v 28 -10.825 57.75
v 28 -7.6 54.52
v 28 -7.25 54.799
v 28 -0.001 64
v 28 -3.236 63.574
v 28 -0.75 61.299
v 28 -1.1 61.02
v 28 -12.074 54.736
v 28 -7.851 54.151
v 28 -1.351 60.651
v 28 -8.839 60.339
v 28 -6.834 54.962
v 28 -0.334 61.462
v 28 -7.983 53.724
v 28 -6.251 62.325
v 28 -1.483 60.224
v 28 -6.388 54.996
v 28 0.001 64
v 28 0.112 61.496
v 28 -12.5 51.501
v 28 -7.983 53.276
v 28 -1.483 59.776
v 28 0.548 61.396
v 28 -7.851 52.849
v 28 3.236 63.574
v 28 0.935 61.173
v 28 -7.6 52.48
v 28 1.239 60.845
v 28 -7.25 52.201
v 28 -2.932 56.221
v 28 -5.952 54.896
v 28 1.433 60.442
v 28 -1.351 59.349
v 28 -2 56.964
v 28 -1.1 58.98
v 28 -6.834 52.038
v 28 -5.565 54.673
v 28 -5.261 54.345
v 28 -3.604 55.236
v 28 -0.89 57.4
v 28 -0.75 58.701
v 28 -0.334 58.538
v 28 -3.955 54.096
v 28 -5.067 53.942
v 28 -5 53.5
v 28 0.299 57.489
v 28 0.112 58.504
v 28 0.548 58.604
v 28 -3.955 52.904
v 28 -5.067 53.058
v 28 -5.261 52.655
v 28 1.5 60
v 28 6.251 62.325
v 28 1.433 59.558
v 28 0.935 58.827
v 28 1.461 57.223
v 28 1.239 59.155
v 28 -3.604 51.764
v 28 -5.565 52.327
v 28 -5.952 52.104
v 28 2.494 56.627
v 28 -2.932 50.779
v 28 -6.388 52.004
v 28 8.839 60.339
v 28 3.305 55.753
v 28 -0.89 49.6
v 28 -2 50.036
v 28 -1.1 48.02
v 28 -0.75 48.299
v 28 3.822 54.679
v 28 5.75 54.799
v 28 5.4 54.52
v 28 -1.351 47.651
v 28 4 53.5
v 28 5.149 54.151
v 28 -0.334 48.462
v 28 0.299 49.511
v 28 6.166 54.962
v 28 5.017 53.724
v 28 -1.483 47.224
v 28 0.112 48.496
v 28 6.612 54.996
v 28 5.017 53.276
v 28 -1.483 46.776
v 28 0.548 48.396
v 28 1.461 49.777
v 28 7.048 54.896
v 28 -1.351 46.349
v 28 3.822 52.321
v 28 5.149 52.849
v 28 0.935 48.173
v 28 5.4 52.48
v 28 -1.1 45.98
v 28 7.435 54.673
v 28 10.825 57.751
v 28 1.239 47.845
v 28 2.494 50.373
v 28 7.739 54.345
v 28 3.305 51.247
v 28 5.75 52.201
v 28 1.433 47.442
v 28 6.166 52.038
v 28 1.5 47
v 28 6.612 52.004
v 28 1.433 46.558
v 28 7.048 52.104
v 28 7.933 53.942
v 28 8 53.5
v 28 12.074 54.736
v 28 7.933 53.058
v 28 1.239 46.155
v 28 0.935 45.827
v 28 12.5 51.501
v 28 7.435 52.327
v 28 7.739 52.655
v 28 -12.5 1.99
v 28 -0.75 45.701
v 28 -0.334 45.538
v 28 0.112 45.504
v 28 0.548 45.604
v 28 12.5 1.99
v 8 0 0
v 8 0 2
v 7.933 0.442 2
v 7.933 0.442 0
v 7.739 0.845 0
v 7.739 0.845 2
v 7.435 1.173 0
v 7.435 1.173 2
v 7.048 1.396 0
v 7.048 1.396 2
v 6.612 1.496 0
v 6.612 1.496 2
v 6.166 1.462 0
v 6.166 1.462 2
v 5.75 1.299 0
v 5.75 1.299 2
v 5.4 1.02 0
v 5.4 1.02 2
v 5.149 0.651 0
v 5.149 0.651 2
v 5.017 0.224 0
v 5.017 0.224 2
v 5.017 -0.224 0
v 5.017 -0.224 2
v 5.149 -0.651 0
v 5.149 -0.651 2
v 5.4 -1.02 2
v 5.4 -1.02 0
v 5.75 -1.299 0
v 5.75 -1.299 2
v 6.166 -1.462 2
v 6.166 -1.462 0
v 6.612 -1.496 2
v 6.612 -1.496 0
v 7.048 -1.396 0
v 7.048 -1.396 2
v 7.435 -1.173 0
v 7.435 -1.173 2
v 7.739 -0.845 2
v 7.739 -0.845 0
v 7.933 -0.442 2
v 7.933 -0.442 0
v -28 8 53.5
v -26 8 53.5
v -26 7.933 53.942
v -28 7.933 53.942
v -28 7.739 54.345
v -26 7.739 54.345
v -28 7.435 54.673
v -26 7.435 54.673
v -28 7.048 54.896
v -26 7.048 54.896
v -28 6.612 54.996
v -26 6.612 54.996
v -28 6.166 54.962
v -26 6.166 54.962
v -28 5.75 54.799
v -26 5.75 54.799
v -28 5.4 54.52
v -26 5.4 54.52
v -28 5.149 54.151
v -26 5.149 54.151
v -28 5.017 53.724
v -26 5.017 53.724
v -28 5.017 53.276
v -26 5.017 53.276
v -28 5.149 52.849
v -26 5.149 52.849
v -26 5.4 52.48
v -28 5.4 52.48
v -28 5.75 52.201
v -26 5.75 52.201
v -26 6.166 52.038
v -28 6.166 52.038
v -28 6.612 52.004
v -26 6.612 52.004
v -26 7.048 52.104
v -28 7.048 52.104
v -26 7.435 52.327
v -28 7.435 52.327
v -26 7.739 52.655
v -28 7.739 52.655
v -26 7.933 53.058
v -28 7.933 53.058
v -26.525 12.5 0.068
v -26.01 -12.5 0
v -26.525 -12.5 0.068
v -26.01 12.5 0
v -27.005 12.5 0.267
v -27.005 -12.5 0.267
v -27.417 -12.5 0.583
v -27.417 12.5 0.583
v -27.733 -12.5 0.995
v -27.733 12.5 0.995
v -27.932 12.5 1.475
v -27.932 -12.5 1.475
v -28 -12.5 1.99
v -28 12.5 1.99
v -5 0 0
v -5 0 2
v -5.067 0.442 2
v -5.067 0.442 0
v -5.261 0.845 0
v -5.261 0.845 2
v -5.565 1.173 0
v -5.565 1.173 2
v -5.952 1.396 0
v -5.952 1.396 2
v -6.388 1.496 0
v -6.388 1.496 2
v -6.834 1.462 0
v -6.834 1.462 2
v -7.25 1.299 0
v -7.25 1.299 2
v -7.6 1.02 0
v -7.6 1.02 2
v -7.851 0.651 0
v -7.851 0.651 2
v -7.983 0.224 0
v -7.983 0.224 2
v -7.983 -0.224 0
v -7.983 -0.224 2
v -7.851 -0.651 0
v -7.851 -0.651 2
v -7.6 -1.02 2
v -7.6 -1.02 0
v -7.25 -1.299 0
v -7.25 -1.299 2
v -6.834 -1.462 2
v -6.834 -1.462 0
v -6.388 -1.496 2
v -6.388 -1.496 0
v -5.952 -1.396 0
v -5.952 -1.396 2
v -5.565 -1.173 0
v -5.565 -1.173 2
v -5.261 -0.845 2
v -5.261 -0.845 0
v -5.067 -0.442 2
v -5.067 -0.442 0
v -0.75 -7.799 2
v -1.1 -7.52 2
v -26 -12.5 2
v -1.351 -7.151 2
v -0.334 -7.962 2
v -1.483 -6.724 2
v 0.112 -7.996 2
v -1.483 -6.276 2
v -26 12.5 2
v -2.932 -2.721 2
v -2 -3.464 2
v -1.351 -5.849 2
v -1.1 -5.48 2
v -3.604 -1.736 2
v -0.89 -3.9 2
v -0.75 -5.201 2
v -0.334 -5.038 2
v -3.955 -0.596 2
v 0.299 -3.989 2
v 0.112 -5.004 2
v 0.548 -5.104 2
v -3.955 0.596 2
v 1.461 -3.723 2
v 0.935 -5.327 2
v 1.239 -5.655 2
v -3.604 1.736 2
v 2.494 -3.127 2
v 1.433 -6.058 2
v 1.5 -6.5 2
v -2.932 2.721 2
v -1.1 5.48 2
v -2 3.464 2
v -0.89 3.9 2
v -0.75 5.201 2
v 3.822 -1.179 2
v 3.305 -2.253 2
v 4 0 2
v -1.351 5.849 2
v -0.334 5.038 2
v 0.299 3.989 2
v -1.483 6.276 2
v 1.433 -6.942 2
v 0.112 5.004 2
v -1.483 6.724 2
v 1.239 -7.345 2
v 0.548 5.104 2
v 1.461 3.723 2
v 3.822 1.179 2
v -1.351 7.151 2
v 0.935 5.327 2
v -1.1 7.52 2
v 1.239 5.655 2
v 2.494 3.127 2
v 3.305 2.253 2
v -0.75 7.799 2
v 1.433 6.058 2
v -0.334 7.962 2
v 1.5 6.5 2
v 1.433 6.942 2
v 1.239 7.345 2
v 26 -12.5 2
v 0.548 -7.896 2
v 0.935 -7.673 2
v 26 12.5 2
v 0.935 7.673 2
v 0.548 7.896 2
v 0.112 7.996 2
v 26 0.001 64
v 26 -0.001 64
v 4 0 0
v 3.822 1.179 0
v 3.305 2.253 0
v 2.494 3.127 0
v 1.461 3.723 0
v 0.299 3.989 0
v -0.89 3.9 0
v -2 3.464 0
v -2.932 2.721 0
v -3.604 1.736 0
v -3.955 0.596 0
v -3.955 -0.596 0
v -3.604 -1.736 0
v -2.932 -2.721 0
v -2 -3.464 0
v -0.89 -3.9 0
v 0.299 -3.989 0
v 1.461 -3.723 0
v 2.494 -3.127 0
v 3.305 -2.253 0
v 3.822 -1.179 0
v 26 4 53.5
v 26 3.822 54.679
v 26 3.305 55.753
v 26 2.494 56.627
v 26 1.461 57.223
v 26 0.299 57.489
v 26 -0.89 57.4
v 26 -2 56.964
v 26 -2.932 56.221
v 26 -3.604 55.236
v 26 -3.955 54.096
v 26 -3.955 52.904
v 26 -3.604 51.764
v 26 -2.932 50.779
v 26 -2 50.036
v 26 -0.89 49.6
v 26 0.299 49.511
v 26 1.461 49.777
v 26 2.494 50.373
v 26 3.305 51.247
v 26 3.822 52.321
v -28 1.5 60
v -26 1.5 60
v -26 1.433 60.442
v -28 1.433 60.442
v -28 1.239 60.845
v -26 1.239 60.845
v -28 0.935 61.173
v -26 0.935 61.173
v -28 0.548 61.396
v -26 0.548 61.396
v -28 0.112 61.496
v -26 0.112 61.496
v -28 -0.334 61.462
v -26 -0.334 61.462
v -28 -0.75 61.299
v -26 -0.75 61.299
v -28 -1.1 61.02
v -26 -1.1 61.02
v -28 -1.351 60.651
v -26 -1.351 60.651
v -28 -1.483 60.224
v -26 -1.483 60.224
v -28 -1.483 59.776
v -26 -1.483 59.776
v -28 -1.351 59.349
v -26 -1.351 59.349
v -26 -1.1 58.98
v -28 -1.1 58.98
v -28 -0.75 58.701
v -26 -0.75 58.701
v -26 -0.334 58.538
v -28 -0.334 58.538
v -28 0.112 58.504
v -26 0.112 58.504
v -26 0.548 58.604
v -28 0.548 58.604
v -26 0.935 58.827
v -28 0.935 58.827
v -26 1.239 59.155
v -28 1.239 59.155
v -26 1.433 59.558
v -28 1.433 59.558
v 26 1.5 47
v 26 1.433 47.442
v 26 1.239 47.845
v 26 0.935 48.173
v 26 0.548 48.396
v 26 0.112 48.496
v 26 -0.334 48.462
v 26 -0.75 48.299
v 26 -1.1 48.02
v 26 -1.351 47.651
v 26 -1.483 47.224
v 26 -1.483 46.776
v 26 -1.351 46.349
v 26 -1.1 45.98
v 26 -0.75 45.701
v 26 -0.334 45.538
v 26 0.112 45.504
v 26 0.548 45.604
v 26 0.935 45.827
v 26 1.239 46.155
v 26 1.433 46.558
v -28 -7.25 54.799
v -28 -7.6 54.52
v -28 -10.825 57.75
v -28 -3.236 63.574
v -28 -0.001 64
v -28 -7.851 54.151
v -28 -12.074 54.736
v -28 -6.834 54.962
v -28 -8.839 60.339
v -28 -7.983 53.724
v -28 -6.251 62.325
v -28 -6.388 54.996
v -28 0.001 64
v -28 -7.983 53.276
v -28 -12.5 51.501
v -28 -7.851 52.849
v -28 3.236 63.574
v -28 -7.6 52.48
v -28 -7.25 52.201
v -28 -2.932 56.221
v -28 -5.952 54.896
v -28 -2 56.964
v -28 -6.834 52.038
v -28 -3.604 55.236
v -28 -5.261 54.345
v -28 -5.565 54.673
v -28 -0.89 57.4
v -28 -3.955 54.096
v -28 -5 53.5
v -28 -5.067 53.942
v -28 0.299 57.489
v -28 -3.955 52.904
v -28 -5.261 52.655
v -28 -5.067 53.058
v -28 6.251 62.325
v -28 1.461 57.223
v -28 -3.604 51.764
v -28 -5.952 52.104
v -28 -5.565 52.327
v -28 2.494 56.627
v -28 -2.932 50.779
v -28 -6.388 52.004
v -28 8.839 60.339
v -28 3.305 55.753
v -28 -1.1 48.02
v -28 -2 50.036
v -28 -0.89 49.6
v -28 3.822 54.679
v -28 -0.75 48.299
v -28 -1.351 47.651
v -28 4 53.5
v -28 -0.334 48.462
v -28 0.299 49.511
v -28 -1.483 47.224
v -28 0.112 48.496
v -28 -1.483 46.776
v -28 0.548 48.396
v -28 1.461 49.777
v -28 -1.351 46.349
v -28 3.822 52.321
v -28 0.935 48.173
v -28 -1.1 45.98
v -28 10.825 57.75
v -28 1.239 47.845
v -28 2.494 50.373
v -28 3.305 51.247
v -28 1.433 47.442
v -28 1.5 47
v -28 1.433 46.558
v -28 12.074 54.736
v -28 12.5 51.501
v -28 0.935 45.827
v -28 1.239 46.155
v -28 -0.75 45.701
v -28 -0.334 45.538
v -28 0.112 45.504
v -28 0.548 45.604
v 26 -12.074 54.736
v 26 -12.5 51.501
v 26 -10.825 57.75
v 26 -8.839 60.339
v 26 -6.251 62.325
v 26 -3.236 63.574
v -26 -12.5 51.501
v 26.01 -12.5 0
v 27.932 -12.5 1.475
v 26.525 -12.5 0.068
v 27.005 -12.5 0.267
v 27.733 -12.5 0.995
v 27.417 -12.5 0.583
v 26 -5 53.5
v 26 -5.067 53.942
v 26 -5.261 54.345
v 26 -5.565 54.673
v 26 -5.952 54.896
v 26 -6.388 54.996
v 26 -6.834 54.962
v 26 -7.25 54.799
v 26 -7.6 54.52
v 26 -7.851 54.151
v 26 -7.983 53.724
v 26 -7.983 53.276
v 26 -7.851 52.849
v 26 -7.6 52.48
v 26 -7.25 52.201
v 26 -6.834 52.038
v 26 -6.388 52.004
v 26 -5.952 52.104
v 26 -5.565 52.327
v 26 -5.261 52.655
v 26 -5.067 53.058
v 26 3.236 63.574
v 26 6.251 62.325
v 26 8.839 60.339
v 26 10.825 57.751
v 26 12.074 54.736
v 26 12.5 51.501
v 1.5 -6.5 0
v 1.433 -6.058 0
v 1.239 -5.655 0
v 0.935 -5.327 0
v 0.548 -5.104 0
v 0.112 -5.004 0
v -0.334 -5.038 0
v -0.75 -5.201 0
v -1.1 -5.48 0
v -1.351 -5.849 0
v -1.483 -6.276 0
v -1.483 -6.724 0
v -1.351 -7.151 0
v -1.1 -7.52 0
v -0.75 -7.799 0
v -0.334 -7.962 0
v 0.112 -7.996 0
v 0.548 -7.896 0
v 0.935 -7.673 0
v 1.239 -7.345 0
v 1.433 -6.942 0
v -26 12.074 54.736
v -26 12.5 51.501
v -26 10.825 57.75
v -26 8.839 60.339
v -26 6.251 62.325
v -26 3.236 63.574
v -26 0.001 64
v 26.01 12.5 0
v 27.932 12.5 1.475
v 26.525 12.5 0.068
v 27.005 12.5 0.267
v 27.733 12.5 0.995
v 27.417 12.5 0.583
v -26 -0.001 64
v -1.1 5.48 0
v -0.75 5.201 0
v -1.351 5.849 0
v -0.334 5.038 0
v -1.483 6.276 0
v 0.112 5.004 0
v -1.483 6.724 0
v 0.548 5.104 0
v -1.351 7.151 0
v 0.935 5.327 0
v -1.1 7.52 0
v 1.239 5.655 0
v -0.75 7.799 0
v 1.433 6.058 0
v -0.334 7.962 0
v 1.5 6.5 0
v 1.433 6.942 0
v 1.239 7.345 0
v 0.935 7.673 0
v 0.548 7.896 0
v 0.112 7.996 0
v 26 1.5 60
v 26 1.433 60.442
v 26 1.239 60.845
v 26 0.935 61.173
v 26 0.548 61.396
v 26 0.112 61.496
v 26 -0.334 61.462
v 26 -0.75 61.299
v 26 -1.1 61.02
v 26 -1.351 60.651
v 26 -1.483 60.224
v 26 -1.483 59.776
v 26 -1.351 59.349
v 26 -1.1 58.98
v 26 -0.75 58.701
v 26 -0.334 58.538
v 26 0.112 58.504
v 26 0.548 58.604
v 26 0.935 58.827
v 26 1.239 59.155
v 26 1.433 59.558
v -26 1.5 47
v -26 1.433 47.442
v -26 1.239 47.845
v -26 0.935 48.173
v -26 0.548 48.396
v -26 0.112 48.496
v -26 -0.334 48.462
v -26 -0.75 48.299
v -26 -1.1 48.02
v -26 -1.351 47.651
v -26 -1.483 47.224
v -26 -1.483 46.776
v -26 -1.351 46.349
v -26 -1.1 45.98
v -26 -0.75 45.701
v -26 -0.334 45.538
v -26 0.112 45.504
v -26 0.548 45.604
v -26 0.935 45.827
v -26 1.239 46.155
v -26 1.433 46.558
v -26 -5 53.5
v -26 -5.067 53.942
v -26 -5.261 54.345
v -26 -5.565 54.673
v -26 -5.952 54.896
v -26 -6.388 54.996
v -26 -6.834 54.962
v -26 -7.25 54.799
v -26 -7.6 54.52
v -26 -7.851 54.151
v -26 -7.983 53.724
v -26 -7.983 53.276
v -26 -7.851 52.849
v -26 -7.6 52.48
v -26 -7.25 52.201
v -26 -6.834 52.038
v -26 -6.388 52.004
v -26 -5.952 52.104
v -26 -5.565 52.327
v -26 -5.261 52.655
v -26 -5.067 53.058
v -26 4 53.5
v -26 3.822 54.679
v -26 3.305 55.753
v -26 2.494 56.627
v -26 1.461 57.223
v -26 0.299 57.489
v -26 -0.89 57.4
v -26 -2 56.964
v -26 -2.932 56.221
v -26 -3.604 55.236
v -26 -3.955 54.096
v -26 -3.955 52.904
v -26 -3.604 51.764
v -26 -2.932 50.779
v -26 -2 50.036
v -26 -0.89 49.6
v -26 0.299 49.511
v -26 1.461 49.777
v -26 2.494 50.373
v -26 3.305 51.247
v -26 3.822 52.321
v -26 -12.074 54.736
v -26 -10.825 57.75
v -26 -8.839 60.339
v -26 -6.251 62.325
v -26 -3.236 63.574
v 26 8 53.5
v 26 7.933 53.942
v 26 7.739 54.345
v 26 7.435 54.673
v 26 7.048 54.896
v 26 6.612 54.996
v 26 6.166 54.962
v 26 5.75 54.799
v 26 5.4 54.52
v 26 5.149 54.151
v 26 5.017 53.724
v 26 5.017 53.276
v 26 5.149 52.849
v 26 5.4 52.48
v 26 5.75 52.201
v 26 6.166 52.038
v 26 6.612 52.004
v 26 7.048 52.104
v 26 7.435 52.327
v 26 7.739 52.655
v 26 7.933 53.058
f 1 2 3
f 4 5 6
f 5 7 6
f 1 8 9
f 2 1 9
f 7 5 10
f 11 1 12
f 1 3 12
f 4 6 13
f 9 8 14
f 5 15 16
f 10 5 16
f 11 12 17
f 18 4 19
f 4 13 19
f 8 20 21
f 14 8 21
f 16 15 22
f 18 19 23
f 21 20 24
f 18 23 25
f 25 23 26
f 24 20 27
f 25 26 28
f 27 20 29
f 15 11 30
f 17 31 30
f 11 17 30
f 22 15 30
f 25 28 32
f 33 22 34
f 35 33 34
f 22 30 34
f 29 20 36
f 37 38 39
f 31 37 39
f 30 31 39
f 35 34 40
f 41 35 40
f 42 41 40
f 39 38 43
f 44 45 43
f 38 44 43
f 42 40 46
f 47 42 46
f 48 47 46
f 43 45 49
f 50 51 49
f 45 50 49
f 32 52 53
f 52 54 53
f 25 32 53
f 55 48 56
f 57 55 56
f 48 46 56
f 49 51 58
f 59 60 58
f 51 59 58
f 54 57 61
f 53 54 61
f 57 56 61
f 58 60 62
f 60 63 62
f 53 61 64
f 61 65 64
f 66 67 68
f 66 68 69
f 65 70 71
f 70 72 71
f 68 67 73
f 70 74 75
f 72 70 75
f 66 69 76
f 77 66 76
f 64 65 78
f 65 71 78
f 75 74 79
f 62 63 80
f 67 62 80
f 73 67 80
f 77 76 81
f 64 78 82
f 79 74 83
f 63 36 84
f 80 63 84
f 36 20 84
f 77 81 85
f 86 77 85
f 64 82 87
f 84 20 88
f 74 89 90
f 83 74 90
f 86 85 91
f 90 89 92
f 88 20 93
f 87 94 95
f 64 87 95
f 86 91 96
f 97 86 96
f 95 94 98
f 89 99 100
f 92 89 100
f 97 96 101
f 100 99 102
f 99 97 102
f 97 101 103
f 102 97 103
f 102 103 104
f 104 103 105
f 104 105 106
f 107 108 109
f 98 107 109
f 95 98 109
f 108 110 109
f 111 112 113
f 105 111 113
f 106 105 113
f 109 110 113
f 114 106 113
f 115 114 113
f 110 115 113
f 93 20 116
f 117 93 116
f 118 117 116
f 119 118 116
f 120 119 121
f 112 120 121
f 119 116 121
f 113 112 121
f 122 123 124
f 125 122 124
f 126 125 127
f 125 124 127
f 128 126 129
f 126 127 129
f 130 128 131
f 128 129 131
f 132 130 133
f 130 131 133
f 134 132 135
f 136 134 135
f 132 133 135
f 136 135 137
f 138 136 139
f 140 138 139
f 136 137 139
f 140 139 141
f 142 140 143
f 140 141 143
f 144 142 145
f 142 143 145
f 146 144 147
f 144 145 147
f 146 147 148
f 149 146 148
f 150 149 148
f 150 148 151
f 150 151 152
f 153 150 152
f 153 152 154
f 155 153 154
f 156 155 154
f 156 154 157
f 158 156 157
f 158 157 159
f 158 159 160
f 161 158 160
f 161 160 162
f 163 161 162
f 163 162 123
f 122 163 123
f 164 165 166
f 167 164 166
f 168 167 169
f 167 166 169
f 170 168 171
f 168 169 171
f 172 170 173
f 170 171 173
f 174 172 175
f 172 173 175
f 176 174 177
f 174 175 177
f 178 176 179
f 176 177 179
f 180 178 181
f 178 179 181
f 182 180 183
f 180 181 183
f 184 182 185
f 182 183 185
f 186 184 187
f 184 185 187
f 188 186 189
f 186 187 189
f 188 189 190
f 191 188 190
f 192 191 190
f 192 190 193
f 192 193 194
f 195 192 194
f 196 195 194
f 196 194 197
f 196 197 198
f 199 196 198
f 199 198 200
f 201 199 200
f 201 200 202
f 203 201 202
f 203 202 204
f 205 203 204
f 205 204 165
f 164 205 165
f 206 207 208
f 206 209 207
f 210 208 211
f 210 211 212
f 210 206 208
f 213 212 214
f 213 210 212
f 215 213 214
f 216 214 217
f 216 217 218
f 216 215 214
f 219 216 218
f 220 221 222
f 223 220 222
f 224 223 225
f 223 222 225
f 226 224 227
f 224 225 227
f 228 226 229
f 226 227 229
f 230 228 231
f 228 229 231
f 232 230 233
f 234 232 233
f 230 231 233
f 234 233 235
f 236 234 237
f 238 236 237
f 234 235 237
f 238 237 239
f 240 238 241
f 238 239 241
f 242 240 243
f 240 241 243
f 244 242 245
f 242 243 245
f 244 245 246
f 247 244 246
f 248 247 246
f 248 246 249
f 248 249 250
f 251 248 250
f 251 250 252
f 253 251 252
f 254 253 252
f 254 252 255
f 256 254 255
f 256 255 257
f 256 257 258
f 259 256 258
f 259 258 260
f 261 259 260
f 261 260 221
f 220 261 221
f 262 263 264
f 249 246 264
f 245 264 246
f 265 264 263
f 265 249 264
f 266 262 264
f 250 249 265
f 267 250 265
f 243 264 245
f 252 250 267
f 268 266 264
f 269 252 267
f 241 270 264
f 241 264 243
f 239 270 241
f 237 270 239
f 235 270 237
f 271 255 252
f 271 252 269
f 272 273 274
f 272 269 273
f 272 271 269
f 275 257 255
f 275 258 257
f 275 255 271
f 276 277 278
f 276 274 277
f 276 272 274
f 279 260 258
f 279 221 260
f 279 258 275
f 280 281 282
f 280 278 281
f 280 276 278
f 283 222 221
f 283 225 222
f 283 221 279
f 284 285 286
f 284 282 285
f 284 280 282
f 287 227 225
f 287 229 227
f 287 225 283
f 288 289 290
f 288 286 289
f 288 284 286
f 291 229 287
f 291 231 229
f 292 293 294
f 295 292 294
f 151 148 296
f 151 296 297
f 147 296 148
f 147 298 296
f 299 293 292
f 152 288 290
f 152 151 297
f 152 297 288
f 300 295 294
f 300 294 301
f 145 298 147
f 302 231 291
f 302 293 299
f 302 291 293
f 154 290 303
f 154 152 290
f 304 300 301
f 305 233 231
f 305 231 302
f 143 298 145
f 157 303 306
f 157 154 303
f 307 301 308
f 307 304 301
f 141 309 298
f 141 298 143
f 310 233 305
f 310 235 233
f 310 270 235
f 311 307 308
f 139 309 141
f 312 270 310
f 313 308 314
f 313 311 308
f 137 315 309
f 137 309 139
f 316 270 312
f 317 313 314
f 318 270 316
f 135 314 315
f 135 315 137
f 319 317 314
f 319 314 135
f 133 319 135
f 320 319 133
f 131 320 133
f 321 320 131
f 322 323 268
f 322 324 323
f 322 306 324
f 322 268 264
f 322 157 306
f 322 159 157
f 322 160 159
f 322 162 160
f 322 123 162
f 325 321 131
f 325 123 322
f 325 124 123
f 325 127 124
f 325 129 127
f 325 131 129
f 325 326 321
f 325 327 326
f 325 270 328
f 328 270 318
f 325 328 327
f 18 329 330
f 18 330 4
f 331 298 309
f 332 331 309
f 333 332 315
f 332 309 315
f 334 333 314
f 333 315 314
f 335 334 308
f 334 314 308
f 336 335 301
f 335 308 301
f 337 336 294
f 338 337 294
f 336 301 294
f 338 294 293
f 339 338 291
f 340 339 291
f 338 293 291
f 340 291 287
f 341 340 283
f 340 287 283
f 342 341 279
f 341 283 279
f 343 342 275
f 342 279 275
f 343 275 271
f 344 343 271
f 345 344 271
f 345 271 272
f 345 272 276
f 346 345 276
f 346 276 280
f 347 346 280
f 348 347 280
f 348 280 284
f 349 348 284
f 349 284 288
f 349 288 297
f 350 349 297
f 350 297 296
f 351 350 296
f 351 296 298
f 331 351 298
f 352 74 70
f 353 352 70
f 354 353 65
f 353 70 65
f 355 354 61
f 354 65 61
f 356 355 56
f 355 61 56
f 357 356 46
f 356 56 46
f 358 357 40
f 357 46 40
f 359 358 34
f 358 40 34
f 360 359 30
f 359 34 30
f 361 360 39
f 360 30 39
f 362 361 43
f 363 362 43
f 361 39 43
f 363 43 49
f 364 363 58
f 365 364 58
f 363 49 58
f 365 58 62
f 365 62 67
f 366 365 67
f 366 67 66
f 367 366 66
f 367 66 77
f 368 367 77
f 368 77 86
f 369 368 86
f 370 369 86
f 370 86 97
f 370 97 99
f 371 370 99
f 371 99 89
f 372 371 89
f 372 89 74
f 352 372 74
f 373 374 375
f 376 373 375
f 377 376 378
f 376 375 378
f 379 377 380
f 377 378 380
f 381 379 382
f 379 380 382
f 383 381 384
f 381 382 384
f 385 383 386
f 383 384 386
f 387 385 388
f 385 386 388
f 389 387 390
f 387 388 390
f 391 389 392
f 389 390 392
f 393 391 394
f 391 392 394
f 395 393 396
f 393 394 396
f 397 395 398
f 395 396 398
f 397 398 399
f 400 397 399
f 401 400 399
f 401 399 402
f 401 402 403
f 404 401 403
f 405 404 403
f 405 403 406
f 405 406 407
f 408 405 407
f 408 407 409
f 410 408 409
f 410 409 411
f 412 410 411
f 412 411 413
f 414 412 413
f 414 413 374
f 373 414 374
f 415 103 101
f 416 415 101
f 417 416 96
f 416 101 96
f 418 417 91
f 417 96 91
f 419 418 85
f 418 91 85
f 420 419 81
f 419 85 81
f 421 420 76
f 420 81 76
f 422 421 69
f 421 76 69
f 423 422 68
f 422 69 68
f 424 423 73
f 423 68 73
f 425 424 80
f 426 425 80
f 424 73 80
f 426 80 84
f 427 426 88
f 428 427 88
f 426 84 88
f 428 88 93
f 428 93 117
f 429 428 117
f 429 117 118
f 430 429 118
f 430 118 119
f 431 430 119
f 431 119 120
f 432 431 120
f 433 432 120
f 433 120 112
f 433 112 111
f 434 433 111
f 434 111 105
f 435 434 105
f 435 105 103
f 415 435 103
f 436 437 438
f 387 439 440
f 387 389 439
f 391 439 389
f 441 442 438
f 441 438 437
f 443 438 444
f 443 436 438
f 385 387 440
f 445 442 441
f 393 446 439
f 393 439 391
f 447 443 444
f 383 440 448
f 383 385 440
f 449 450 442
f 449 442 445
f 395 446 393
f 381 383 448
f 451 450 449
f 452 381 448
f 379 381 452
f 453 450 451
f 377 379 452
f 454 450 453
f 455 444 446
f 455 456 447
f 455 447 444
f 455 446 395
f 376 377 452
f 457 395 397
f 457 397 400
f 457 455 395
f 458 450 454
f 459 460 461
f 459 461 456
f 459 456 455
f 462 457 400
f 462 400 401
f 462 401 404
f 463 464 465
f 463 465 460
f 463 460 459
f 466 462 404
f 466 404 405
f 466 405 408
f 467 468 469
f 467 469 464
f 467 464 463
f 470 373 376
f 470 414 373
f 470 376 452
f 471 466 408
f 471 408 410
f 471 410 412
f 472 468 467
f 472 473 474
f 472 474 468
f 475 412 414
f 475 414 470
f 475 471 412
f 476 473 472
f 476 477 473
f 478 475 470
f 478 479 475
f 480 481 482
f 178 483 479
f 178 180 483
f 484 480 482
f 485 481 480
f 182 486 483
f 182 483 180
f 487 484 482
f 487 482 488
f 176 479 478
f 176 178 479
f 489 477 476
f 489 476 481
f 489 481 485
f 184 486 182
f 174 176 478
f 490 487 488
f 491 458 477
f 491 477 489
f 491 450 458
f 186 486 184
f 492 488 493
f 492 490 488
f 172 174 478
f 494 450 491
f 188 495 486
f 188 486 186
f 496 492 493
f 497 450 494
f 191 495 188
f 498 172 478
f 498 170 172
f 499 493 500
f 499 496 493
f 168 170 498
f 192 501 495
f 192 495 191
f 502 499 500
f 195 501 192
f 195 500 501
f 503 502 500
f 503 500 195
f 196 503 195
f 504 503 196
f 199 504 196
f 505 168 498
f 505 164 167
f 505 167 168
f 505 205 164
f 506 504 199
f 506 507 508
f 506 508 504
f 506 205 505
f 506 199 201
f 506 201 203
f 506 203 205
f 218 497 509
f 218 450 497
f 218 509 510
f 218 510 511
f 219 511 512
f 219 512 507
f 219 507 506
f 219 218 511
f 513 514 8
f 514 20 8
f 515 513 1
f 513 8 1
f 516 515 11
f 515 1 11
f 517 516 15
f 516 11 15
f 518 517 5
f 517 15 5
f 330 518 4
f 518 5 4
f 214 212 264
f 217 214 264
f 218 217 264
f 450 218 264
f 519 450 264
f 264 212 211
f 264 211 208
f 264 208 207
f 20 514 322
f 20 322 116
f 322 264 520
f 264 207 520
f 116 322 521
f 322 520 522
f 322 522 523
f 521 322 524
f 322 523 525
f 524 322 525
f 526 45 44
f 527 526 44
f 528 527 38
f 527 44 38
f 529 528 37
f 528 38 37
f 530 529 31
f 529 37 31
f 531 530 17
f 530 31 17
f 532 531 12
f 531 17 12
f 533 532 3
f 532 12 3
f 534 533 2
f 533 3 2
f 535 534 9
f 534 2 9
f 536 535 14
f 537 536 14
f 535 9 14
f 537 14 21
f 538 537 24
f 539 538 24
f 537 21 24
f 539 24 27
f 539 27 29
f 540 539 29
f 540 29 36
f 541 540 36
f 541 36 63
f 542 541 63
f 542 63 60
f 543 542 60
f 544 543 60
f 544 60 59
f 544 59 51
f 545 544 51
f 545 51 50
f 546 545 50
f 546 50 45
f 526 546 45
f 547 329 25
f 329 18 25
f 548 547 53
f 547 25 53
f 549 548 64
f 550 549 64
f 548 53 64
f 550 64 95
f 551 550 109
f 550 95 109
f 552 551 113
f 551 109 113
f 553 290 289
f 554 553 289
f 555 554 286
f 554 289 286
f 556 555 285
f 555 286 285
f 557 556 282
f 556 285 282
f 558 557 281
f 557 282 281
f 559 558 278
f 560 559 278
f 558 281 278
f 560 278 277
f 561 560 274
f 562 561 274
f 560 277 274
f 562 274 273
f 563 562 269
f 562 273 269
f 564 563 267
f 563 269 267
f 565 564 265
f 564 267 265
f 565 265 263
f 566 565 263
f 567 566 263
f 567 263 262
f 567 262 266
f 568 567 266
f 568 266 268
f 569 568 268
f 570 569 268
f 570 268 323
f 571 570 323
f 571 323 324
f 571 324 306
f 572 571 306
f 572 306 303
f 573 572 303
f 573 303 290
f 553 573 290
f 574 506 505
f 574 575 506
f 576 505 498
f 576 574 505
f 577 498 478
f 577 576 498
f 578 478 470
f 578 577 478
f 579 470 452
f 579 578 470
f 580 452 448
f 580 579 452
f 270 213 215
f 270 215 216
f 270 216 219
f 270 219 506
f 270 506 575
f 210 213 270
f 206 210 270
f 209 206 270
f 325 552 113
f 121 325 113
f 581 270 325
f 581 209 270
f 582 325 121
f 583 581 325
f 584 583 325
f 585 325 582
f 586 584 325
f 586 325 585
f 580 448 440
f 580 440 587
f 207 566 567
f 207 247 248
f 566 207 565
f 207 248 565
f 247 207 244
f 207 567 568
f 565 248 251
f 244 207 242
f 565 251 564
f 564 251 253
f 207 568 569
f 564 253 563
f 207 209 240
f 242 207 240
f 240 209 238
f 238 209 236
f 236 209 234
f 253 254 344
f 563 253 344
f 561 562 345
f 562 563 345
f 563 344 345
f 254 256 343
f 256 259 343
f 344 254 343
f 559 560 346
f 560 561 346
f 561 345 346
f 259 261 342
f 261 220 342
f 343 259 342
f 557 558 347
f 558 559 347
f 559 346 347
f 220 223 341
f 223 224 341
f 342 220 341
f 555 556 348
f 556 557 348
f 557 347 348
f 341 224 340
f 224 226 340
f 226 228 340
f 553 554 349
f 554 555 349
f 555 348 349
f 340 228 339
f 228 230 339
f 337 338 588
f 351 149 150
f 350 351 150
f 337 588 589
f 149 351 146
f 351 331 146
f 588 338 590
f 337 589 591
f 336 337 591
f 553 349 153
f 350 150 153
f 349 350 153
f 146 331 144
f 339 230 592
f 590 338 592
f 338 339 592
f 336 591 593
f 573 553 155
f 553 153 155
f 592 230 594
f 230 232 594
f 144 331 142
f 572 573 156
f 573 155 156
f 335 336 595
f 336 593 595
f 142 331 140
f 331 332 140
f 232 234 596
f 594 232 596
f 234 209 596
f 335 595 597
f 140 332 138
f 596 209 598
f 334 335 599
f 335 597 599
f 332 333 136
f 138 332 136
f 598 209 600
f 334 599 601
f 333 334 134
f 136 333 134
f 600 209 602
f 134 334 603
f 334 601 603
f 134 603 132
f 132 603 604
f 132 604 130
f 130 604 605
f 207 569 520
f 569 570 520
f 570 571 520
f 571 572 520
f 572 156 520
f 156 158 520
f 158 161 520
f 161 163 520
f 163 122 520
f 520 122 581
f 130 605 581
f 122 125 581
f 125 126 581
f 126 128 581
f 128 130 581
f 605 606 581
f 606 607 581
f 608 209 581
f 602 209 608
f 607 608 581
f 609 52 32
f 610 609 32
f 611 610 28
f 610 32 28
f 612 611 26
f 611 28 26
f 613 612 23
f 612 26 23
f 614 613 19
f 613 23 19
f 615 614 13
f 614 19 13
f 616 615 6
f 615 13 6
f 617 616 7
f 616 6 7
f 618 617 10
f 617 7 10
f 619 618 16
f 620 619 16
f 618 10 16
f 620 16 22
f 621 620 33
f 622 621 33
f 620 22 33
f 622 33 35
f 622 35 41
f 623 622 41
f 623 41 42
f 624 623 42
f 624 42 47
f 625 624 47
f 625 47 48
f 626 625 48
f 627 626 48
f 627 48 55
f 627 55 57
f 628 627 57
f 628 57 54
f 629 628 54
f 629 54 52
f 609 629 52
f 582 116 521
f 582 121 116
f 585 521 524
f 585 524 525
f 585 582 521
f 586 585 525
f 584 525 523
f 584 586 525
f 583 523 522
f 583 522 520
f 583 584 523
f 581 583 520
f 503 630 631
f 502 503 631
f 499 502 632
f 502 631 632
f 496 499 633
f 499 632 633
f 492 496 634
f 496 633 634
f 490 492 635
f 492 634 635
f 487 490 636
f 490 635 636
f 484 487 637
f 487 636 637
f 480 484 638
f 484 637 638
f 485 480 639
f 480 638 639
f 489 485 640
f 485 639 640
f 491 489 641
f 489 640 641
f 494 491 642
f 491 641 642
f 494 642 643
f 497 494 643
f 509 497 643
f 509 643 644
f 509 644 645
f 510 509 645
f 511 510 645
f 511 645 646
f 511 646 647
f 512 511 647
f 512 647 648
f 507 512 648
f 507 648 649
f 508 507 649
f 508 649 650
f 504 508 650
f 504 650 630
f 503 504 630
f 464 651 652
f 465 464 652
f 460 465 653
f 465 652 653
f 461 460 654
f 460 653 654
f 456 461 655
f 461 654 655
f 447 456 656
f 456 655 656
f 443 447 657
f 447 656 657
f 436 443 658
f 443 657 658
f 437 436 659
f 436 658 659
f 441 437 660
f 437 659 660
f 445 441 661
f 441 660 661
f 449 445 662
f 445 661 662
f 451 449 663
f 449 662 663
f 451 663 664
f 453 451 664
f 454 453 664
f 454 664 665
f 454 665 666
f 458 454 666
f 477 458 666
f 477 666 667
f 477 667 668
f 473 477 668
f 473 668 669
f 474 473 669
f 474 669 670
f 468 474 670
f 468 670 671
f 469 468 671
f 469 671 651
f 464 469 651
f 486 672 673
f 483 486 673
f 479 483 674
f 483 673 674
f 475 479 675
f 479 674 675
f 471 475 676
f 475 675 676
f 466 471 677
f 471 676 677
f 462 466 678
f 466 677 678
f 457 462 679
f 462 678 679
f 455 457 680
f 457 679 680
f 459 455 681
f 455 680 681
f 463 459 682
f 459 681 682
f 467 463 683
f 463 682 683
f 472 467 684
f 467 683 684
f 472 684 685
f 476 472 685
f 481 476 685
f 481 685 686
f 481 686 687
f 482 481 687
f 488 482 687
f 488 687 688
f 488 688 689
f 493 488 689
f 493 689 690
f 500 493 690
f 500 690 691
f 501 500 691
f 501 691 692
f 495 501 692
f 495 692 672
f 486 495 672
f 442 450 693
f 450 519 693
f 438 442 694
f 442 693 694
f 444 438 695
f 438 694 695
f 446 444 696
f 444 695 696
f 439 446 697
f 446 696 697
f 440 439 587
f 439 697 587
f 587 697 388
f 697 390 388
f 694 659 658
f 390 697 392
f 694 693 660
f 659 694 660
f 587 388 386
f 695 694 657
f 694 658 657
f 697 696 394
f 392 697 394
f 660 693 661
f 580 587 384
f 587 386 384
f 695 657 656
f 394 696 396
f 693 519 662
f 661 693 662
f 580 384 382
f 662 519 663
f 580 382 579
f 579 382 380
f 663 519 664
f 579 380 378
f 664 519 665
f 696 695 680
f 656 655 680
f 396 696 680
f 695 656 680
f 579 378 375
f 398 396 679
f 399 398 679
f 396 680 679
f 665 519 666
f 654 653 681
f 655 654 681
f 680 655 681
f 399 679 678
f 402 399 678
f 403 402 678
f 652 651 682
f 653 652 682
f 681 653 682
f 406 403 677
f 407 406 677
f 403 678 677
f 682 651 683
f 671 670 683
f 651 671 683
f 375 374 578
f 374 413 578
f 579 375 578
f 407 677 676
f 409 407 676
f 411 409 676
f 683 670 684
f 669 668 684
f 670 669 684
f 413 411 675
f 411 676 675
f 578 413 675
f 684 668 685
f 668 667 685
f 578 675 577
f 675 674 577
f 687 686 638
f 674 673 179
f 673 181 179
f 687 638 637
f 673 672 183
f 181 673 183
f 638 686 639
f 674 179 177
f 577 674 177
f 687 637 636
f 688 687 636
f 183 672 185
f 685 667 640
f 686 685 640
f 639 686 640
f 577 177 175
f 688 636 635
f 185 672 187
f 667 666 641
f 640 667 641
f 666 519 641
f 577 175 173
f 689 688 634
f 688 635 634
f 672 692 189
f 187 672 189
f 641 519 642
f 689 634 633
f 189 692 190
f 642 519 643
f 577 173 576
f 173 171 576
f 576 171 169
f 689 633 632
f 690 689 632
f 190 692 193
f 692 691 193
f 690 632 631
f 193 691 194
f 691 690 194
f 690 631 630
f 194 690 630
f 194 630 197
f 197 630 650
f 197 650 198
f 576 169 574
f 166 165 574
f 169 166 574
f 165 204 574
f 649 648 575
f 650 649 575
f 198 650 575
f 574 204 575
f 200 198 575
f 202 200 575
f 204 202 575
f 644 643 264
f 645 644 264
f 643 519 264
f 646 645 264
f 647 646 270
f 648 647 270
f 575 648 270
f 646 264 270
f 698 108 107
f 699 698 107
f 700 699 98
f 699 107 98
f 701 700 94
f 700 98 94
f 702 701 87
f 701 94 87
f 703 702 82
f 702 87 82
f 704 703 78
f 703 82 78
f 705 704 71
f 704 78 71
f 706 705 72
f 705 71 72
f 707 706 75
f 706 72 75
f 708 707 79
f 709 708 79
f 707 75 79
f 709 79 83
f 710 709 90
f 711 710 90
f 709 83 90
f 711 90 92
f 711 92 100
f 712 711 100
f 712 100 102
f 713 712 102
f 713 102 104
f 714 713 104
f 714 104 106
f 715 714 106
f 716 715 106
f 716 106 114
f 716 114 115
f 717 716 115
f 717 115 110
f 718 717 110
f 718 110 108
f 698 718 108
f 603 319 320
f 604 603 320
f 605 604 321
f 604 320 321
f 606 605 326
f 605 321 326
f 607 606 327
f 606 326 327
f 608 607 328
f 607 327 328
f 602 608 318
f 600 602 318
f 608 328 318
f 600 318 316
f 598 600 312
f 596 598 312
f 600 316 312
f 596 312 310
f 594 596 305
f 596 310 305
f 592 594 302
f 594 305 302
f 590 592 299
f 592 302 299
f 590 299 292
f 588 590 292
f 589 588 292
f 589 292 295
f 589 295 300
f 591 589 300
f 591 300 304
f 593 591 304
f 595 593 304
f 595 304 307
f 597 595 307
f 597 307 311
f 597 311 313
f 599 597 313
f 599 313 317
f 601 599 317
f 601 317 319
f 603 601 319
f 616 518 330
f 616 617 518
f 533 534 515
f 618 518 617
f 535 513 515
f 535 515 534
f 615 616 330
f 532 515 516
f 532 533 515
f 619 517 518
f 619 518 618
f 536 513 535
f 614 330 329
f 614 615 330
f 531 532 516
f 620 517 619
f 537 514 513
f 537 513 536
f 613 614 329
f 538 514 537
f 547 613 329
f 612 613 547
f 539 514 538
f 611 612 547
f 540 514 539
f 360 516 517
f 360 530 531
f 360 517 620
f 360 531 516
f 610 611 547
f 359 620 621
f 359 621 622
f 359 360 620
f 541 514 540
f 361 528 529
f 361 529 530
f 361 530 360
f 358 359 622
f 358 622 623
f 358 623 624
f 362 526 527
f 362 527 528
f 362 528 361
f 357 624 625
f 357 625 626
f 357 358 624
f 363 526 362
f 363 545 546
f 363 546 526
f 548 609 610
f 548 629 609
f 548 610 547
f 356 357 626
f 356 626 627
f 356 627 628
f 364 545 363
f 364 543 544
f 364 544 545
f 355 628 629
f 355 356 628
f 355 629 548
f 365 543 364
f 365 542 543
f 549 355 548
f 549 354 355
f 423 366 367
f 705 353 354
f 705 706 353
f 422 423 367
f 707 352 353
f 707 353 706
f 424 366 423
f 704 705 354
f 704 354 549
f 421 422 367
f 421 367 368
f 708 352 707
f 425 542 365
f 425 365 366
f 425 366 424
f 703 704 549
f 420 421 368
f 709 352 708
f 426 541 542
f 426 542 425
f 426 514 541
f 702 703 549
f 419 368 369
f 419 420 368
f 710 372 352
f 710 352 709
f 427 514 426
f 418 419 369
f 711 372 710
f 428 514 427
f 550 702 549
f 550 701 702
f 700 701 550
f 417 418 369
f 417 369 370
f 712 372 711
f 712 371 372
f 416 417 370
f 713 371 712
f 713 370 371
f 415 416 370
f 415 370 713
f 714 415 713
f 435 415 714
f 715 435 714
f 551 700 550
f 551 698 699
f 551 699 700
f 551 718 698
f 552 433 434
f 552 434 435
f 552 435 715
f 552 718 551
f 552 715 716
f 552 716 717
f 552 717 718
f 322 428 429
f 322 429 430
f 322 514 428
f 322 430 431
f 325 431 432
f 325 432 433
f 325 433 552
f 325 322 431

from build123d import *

# Parameters (mm, degrees)
SKETCH_W        = 56
SKETCH_H        = 25
PAD_DEPTH       = 2
SKETCH001_W     = 2
SKETCH001_H     = 25
PAD001_DEPTH    = 62
SKETCH002_R     = 4
SKETCH002_R_2   = 1.5
POCKET_DEPTH    = 56.001
FILLET_R        = 12.499
FILLET001_R     = 1.99
SKETCH003_R     = 4
SKETCH003_R_2   = 1.5
POCKET001_DEPTH = 5


with BuildPart() as part:
    # Sketch → Pad (new body)
    with BuildSketch(Plane.XY):
        Rectangle(SKETCH_W, SKETCH_H)
    extrude(amount=PAD_DEPTH)

    # Sketch001 (on Face6 of Pad) → Pad001 (join)
    with BuildSketch(Plane.XY.offset(2)):
        with Locations((27, 0)):
            Rectangle(SKETCH001_W, SKETCH001_H)
        with Locations((-27, 0)):
            Rectangle(SKETCH001_W, SKETCH001_H)
    extrude(amount=PAD001_DEPTH)

    # Sketch002 (on Face10 of Pad001) → Pocket (cut, through all)
    with BuildSketch(Plane.YZ.offset(28)):
        with Locations((0, 53.5)):
            Circle(SKETCH002_R)
        with Locations((0, 47)):
            Circle(SKETCH002_R_2)
        with Locations((6.5, 53.5)):
            Circle(SKETCH002_R_2)
        with Locations((-6.5, 53.5)):
            Circle(SKETCH002_R_2)
        with Locations((0, 60)):
            Circle(SKETCH002_R_2)
    extrude(amount=-POCKET_DEPTH, mode=Mode.SUBTRACT)

    # Fillet
    fillet_edges = [part.edges().sort_by_distance(p)[0] for p in [
        (-27, -12.5, 64),
        (-27, 12.5, 64),
        (27, -12.5, 64),
        (27, 12.5, 64),
    ]]
    fillet(fillet_edges, radius=FILLET_R)

    # Fillet001
    fillet001_edges = [part.edges().sort_by_distance(p)[0] for p in [
        (28, 0, 0),
        (-28, 0, 0),
    ]]
    fillet(fillet001_edges, radius=FILLET001_R)

    # Sketch003 (on Face6 of Fillet001) → Pocket001 (cut)
    with BuildSketch(Plane.XY.offset(2)):
        Circle(SKETCH003_R)
        with Locations((6.5, 0)):
            Circle(SKETCH003_R_2)
        with Locations((-6.5, 0)):
            Circle(SKETCH003_R_2)
        with Locations((0, -6.5)):
            Circle(SKETCH003_R_2)
        with Locations((0, 6.5)):
            Circle(SKETCH003_R_2)
    extrude(amount=-POCKET001_DEPTH, mode=Mode.SUBTRACT)


solid = part.part
